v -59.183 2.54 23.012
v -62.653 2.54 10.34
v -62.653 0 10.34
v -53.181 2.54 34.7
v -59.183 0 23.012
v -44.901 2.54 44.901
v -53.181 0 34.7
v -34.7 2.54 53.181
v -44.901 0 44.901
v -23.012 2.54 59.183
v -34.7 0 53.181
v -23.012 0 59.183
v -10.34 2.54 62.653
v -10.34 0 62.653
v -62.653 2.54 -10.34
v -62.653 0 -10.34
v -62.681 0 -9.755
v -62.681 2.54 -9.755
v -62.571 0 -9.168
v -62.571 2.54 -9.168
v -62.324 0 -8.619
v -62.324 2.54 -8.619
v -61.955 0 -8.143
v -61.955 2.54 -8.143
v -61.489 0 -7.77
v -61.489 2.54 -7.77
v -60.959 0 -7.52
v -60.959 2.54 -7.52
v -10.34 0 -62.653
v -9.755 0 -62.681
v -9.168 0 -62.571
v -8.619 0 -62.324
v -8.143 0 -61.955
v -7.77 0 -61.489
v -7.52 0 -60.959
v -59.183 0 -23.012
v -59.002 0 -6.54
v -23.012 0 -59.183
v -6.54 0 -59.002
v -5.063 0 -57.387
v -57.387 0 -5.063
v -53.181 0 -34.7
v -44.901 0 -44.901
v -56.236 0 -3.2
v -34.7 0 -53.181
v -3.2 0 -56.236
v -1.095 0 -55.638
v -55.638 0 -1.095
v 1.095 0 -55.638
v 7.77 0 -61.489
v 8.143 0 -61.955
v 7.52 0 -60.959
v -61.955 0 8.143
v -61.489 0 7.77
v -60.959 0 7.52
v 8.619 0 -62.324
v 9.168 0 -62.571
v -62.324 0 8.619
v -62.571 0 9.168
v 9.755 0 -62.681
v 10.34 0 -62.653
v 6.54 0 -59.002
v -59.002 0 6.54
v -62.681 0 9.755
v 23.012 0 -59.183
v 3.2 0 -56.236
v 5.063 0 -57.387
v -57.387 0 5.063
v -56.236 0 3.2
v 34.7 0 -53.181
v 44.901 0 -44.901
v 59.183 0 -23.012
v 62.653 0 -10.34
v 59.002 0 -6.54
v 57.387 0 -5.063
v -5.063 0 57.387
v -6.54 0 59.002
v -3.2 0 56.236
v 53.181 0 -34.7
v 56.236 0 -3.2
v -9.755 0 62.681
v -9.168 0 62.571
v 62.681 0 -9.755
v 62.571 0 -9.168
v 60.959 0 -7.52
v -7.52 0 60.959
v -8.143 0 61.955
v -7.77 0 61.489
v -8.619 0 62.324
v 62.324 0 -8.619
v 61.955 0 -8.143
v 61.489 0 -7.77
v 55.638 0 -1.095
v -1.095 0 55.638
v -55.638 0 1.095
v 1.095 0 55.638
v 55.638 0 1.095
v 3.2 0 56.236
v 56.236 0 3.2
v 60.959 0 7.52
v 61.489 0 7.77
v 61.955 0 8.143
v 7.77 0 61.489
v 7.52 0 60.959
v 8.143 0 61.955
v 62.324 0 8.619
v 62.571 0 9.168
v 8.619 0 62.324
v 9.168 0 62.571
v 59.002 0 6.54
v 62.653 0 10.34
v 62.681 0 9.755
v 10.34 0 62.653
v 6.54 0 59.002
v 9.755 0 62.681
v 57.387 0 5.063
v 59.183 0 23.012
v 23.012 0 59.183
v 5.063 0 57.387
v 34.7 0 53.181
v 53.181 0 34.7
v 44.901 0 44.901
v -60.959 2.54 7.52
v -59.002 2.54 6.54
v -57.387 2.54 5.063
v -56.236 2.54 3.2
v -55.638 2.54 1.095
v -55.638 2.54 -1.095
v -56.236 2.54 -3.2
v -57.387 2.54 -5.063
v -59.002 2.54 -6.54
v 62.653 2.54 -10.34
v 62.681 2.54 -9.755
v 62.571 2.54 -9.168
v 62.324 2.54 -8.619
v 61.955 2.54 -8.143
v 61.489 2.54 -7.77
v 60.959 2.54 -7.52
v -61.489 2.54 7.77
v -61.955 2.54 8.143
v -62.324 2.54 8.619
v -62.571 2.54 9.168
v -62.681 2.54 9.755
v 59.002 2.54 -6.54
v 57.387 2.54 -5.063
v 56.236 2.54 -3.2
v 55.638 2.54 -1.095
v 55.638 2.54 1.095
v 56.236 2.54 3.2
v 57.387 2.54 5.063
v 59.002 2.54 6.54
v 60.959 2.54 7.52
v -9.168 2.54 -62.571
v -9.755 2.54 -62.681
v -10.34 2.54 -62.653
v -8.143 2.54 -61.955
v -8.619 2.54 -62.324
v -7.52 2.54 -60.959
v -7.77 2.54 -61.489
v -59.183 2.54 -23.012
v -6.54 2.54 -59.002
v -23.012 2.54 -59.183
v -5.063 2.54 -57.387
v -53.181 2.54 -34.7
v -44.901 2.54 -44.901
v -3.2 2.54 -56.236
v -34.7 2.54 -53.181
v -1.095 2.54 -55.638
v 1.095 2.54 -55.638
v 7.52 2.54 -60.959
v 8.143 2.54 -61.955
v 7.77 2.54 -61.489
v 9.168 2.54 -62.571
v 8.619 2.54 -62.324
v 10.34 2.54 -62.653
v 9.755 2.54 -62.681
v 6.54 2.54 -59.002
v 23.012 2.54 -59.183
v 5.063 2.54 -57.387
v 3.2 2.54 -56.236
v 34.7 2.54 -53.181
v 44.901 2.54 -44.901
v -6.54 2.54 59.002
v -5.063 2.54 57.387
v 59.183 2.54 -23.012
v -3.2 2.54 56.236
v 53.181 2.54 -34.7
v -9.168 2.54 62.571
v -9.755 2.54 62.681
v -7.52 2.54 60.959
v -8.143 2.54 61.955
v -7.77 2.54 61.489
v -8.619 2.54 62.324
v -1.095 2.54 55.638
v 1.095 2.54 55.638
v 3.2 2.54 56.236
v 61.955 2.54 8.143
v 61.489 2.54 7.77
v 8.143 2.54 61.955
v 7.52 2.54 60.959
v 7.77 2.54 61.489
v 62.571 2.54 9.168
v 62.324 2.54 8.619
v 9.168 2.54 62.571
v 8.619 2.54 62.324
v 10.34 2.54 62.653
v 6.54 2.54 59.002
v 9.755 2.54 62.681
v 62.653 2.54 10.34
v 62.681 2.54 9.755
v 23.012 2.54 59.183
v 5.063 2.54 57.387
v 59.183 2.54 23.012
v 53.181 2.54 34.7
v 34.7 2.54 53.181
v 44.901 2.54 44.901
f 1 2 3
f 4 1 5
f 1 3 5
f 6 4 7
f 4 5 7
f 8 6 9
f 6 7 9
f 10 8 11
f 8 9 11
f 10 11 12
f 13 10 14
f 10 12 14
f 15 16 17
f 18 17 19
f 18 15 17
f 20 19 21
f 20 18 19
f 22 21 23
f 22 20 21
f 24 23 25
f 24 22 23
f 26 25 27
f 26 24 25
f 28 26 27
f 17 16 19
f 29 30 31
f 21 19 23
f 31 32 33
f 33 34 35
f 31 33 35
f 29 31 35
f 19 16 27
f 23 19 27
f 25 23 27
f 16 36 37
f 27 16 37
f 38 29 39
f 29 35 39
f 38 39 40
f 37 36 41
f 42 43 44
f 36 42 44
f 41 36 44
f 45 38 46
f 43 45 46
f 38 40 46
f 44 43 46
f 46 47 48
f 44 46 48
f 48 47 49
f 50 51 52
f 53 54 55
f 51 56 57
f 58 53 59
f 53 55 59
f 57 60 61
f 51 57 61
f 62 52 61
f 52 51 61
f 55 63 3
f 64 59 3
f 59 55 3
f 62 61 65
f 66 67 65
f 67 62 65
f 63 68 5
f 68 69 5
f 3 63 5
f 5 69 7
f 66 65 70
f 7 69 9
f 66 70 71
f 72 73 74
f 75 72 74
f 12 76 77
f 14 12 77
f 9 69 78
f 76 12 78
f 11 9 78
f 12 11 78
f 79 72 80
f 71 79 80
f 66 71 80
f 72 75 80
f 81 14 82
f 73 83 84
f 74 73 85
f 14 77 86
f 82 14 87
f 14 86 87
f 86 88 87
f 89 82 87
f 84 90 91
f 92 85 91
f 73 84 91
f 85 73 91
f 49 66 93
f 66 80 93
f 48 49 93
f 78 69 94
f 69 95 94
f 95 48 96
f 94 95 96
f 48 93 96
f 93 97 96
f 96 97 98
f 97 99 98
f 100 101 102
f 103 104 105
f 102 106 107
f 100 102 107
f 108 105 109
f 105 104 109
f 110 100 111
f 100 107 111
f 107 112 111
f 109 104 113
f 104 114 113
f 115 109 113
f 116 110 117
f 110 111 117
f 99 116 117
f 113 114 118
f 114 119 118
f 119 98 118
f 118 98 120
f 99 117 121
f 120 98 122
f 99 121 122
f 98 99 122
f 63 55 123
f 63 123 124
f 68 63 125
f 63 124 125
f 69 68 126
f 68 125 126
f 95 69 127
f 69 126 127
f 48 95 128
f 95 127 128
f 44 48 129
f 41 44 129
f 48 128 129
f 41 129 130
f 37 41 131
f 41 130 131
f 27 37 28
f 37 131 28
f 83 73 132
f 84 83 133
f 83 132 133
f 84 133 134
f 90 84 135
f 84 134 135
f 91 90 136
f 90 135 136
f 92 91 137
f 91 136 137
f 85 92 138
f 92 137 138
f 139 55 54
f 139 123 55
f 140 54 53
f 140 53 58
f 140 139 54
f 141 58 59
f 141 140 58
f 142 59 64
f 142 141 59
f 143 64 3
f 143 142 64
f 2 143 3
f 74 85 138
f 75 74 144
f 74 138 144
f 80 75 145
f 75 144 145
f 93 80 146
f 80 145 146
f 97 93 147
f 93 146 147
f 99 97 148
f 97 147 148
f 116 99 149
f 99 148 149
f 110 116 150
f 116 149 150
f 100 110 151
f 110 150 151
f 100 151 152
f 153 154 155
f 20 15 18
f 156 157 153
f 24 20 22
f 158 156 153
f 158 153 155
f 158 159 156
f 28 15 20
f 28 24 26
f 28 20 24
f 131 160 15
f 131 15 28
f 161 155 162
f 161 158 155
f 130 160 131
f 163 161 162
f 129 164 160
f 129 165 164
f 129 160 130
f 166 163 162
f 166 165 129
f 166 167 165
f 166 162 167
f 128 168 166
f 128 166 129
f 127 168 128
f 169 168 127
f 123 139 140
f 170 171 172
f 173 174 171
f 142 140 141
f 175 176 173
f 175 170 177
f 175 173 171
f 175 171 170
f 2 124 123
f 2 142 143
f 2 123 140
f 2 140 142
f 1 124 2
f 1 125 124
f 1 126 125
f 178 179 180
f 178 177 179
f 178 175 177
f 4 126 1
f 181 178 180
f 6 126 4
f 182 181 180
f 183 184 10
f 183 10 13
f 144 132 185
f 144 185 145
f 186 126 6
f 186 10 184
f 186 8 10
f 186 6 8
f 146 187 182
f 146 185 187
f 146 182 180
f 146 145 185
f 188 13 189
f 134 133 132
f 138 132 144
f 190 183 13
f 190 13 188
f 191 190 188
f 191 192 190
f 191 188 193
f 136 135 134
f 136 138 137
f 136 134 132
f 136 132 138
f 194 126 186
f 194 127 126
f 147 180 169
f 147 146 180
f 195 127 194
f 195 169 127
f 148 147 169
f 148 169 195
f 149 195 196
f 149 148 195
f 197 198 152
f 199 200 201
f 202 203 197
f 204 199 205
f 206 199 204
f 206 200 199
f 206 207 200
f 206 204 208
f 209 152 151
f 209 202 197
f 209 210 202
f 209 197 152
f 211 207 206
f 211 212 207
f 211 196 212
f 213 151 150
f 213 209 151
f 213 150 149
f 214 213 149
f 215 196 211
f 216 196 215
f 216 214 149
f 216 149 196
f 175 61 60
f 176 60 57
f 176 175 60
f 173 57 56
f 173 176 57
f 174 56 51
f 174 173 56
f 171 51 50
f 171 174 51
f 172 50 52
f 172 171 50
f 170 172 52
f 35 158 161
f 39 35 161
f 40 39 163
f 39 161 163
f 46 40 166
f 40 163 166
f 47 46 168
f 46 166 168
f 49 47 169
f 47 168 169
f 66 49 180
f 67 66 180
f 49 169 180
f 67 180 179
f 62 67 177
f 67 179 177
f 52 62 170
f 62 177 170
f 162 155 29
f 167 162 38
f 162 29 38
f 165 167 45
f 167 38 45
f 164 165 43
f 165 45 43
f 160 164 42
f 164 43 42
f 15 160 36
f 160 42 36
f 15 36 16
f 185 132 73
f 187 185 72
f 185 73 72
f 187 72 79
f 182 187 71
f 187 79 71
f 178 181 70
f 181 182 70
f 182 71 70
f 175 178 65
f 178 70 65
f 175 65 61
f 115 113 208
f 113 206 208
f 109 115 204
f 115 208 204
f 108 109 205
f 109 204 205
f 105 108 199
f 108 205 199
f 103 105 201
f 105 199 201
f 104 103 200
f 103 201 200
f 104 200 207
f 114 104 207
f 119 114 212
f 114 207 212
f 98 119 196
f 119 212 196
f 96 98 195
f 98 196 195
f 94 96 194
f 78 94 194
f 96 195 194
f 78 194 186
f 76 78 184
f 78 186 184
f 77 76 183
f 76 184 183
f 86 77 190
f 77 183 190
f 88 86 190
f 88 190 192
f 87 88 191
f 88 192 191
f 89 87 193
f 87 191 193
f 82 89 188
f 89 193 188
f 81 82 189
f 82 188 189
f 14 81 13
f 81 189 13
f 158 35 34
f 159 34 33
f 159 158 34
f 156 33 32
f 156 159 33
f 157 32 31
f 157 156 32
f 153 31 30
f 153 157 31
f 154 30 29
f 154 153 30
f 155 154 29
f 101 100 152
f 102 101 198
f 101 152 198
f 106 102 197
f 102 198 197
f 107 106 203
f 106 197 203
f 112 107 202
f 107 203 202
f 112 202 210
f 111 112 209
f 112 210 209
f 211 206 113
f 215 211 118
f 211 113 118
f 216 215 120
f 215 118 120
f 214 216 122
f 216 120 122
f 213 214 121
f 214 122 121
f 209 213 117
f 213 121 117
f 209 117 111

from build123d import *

# Parameters (mm, degrees)
SKETCH3_R                = 63.5
BOSS_EXTRUDE1_DEPTH      = 2.54
CUT_EXTRUDE1_REACH       = 91.838
SKETCH4_R                = 7.9375
FILLET1_R                = 2.54
CIRPATTERN1_COUNT        = 4
FILLET1_OF_CIRPATTERN1_R = 2.54


with BuildPart() as part:
    # Sketch3 → Boss-Extrude1 (new body)
    with BuildSketch(Plane(origin=(0, 0, 0), x_dir=(1, 0, 0), z_dir=(0, 1, 0))):
        with Locations(Location((0, 0, 0), (0, 0, 270))):
            Circle(SKETCH3_R)
    extrude(amount=BOSS_EXTRUDE1_DEPTH)

    # Sketch4 → Cut-Extrude1 (cut, up to next)
    with BuildSketch(Plane(origin=(0, 2.54, 0), x_dir=(1, 0, 0), z_dir=(0, 1, 0)), mode=Mode.PRIVATE) as cut_extrude1_sk1:
        with Locations((0, 63.5)):
            Circle(SKETCH4_R)
    cut_extrude1_tool1 = extrude(cut_extrude1_sk1.sketch, amount=-CUT_EXTRUDE1_REACH, mode=Mode.PRIVATE) & part.part
    cut_extrude1 = cut_extrude1_tool1.solids().sort_by_distance((0, 2.54, -63.5))[0]
    add(cut_extrude1, mode=Mode.SUBTRACT)

    # Fillet1
    fillet1_edges = [part.edges().sort_by_distance(p)[0] for p in [
        (7.921981901, 1.27, -63.00390625),
        (-7.921981901, 1.27, -63.00390625),
    ]]
    fillet(fillet1_edges, radius=FILLET1_R)

    # CirPattern1: Cut-Extrude1 ×4 about axis
    cirpattern1_axis = Axis((0, 0, 0), (0, 1, 0))
    for i in range(1, CIRPATTERN1_COUNT):
        add(cut_extrude1.rotate(cirpattern1_axis, i * 360 / CIRPATTERN1_COUNT), mode=Mode.SUBTRACT)

    # Fillet1 of CirPattern1
    fillet1_of_cirpattern1_edges = [part.edges().sort_by_distance(p)[0] for p in [
        (-63.00390625, 1.27, -7.921981901),
        (-63.00390625, 1.27, 7.921981901),
        (-7.921981901, 1.27, 63.00390625),
        (7.921981901, 1.27, 63.00390625),
        (63.00390625, 1.27, 7.921981901),
        (63.00390625, 1.27, -7.921981901),
    ]]
    fillet(fillet1_of_cirpattern1_edges, radius=FILLET1_OF_CIRPATTERN1_R)


solid = part.part
